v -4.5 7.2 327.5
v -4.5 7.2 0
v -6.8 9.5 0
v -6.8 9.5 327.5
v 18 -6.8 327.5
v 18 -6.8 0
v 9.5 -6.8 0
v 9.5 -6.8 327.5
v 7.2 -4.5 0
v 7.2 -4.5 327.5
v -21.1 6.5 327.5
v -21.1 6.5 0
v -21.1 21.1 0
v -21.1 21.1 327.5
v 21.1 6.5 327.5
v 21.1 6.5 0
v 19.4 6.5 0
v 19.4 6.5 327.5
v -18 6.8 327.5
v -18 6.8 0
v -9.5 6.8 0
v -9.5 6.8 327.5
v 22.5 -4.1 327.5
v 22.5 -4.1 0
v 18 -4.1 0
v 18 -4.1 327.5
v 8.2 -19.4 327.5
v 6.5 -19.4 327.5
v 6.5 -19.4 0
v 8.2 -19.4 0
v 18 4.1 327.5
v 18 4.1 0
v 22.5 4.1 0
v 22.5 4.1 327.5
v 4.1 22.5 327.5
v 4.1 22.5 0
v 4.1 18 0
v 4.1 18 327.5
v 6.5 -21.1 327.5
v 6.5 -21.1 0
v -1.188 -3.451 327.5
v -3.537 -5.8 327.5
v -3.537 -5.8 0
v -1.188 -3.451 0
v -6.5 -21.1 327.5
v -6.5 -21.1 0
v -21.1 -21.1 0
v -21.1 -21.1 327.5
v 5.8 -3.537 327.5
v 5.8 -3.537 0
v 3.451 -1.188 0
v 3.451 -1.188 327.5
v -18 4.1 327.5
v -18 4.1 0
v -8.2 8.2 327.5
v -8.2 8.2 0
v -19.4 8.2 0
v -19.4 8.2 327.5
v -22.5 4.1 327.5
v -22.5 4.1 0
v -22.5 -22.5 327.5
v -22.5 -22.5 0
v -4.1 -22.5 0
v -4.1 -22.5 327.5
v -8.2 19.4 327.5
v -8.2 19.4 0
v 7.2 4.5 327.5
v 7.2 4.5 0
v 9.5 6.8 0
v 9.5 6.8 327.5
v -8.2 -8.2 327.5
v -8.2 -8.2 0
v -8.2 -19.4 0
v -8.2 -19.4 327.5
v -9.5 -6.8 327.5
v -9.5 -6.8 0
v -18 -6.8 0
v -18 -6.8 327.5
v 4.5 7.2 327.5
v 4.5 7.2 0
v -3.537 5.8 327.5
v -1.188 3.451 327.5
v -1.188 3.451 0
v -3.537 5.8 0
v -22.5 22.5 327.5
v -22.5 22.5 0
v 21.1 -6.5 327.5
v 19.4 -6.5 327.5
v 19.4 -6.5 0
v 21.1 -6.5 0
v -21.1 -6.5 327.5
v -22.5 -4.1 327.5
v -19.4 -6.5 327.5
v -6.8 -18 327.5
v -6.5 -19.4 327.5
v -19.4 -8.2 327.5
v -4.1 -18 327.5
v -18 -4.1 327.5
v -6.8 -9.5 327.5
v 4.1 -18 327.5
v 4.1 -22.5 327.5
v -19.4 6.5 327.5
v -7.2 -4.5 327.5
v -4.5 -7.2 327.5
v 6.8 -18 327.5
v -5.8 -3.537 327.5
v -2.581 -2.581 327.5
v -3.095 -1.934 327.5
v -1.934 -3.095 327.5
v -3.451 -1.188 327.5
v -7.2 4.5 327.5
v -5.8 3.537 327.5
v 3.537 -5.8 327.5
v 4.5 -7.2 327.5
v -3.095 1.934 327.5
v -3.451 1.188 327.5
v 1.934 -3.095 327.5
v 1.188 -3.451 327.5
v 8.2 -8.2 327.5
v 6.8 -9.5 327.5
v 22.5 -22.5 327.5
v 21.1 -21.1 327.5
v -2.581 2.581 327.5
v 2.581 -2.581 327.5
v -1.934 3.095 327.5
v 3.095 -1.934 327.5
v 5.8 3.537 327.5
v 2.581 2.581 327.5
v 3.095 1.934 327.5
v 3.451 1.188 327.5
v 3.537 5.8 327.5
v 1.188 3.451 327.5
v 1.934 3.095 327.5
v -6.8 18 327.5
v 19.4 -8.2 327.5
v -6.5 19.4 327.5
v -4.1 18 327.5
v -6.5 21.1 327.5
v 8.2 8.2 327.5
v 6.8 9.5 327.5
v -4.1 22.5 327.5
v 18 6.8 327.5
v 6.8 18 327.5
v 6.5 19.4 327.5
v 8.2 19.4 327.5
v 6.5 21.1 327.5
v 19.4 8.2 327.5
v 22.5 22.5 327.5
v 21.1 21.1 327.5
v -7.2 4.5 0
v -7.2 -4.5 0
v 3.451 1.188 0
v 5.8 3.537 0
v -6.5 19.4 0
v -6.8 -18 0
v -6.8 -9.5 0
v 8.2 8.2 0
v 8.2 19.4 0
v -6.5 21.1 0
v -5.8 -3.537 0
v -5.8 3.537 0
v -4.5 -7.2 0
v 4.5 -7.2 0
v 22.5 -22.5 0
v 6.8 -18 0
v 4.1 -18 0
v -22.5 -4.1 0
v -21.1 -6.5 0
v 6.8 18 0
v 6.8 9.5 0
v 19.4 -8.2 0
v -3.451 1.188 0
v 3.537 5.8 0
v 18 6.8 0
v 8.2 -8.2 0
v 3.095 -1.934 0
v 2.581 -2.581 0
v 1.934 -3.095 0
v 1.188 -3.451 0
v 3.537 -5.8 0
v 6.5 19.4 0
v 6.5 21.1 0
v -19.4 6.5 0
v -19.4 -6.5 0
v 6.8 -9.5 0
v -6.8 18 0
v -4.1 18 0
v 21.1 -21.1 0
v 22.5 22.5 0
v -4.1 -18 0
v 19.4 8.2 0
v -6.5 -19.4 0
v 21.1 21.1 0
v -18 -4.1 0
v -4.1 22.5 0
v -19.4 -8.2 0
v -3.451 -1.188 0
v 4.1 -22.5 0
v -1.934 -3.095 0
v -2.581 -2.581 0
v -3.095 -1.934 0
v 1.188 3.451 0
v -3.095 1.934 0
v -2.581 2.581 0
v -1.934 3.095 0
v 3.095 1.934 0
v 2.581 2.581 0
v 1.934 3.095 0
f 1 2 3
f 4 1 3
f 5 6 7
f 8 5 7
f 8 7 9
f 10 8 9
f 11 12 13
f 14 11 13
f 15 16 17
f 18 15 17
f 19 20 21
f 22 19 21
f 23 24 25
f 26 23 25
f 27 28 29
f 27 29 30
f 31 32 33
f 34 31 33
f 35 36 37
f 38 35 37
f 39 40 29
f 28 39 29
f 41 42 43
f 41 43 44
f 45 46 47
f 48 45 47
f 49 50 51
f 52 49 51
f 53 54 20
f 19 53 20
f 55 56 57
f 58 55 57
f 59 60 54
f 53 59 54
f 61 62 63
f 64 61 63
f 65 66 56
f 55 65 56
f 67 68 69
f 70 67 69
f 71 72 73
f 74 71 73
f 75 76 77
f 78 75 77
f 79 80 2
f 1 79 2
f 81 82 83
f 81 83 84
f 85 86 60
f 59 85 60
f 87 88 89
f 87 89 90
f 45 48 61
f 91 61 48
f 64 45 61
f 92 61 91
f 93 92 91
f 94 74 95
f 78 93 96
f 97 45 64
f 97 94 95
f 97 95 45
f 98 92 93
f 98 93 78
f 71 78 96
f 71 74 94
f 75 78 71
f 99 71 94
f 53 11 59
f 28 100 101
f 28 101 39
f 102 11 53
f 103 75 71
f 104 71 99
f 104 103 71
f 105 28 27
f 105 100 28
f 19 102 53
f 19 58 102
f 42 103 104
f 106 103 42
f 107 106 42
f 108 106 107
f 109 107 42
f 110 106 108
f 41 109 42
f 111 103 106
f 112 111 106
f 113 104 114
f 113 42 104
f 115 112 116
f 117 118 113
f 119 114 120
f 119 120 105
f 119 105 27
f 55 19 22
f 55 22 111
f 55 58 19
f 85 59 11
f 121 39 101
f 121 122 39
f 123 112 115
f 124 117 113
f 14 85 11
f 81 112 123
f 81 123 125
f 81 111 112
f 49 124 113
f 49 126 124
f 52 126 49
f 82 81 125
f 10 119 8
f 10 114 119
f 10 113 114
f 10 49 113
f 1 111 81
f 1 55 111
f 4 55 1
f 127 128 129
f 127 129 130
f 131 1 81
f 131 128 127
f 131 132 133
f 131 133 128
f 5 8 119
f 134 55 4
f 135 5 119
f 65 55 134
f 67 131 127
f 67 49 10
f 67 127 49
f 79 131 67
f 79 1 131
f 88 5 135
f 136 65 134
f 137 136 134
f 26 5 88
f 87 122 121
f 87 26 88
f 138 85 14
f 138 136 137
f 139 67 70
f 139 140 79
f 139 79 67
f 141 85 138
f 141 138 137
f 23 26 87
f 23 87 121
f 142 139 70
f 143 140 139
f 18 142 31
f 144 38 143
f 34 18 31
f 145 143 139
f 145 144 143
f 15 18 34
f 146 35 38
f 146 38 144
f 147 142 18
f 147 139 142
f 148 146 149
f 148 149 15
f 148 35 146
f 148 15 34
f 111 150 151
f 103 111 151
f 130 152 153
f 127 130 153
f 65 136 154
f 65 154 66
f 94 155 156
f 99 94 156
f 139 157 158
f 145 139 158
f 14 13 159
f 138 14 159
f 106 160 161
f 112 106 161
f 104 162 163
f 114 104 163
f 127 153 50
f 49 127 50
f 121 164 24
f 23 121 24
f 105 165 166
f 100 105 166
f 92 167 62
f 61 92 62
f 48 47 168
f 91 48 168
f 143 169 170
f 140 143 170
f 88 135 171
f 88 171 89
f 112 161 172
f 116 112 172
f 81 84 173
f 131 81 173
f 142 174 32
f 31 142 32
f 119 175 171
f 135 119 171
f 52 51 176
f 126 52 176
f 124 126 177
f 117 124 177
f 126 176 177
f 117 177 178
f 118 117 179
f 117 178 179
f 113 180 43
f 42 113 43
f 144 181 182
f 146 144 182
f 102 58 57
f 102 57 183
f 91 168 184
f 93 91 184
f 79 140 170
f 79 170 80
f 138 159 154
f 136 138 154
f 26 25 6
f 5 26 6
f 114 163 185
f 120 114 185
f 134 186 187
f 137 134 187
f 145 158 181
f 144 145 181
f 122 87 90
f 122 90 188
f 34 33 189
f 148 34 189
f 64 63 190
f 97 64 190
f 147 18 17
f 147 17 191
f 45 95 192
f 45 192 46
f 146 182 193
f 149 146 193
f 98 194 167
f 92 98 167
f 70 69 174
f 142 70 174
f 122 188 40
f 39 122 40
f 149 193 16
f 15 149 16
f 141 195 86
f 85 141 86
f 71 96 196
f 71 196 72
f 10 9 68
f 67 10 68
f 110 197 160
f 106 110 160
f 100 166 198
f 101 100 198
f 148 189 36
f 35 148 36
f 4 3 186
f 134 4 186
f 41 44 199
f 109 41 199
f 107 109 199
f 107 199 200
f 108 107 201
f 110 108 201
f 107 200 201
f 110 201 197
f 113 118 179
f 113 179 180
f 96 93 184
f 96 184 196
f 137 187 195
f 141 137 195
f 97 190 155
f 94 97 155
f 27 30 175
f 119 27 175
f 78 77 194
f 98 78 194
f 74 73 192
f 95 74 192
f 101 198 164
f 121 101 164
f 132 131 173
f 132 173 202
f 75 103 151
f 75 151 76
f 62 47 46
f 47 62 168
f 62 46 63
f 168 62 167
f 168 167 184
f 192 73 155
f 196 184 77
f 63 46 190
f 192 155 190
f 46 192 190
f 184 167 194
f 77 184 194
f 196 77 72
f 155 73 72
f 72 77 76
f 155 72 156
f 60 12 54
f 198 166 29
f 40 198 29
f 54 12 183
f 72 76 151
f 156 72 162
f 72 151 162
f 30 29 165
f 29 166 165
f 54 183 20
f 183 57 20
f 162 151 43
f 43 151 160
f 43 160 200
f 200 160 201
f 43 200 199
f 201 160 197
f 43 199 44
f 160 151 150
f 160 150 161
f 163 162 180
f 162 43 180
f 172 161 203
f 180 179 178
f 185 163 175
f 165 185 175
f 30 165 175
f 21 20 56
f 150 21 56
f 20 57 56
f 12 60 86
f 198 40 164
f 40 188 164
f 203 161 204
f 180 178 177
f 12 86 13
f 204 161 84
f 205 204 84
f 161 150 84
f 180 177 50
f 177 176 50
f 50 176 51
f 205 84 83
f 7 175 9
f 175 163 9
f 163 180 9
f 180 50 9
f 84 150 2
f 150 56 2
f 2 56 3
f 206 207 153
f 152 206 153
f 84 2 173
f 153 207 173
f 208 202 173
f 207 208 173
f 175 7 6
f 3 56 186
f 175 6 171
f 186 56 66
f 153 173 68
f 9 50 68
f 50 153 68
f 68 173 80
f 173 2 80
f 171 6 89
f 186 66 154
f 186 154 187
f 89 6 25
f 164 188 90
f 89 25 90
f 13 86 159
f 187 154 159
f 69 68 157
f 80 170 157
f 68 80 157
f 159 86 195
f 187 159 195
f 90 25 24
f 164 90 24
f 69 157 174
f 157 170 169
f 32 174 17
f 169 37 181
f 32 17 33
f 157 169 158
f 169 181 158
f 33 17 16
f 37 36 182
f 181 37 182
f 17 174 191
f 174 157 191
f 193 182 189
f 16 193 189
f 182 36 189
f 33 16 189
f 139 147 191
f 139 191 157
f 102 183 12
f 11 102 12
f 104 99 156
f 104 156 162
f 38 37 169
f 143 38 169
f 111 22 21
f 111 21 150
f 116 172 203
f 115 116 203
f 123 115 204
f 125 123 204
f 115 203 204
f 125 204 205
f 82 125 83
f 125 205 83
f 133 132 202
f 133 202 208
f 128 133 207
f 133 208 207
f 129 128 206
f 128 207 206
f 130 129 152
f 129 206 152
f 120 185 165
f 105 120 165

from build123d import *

# Parameters (mm, degrees)
BOSS_EXTRUDE1_DEPTH = 327.500000024


with BuildPart() as part:
    # Sketch1 → Boss-Extrude1 (new body)
    with BuildSketch(Plane.XY):
        Polygon((-22.499997904, -22.500007621), (-4.099997904, -22.500007621), (-4.099997904, -18.000007621), (-6.799997904, -18.000007621), (-6.799997904, -9.500007621), (-4.499997904, -7.200007621), (4.500002096, -7.200007621), (6.800002096, -9.500007621), (6.800002096, -18.000007621), (4.100002096, -18.000007621), (4.100002096, -22.500007621), (22.500002096, -22.500007621), (22.500002096, -4.100007621), (18.000002096, -4.100007621), (18.000002096, -6.800007621), (9.500002096, -6.800007621), (7.200002096, -4.500007621), (7.200002096, 4.499992379), (9.500002096, 6.799992379), (18.000002096, 6.799992379), (18.000002096, 4.099992379), (22.500002096, 4.099992379), (22.500002096, 22.499992379), (4.100002096, 22.499992379), (4.100002096, 17.999992379), (6.800002096, 17.999992379), (6.800002096, 9.499992379), (4.500002096, 7.199992379), (-4.499997904, 7.199992379), (-6.799997904, 9.499992379), (-6.799997904, 17.999992379), (-4.099997904, 17.999992379), (-4.099997904, 22.499992379), (-22.499997904, 22.499992379), (-22.499997904, 4.099992379), (-17.999997904, 4.099992379), (-17.999997904, 6.799992379), (-9.499997904, 6.799992379), (-7.199997904, 4.499992379), (-7.199997904, -4.500007621), (-9.499997904, -6.800007621), (-17.999997904, -6.800007621), (-17.999997904, -4.100007621), (-22.499997904, -4.100007621), align=None)
        Polygon((8.200003223, 8.199980186), (8.199989777, 19.399992368), (6.500002085, 19.399992368), (6.500002085, 21.099984758), (21.100004192, 21.099984758), (21.100004192, 6.499980188), (19.400009891, 6.499980188), (19.400009891, 8.199980186), align=None, mode=Mode.SUBTRACT)
        Polygon((-19.399997893, 6.499992368), (-21.099990283, 6.499992368), (-21.099990283, 21.099994475), (-6.499974376, 21.099994475), (-6.49997587, 19.399985233), (-8.199975868, 19.399986727), (-8.199985712, 8.19998006), (-19.399997893, 8.19998006), align=None, mode=Mode.SUBTRACT)
        Polygon((-6.499997893, -21.1), (-21.1, -21.1), (-21.1, -6.499995431), (-19.400002096, -6.499995431), (-19.400002096, -8.199995429), (-8.199995429, -8.199995429), (-8.199995429, -19.40000761), (-6.499997893, -19.400009104), align=None, mode=Mode.SUBTRACT)
        Polygon((6.499989905, -19.400011813), (8.199989903, -19.400011813), (8.199989903, -8.200005146), (19.400002085, -8.200005146), (19.400003579, -6.500017454), (21.099994475, -6.500018948), (21.099994475, -21.100009717), (6.499989905, -21.100009717), align=None, mode=Mode.SUBTRACT)
        with BuildLine():
            Line((-5.799999723, 3.537265469), (-3.451121085, 1.18838683))
            ThreePointArc((-3.451121085, 1.18838683), (-2.580942431, 2.580937072), (-1.188393996, 3.451118617))
            Line((-1.188393996, 3.451118617), (-3.537277512, 5.799992379))
            Line((-3.537277512, 5.799992379), (3.537277512, 5.799992379))
            Line((3.537277512, 5.799992379), (1.188393996, 3.451118617))
            ThreePointArc((1.188393996, 3.451118617), (2.580942431, 2.580937072), (3.451121085, 1.18838683))
            Line((3.451121085, 1.18838683), (5.799999723, 3.537265469))
            Line((5.799999723, 3.537265469), (5.799985034, -3.537266022))
            Line((5.799985034, -3.537266022), (3.451117181, -1.188398168))
            ThreePointArc((3.451117181, -1.188398168), (2.580938191, -2.580941312), (1.188393996, -3.451118617))
            Line((1.188393996, -3.451118617), (3.537277512, -5.799992379))
            Line((3.537277512, -5.799992379), (-3.537277512, -5.799992379))
            Line((-3.537277512, -5.799992379), (-1.188393996, -3.451118617))
            ThreePointArc((-1.188393996, -3.451118617), (-2.580938191, -2.580941311), (-3.451117181, -1.188398168))
            Line((-3.451117181, -1.188398168), (-5.799985034, -3.537266022))
            Line((-5.799985034, -3.537266022), (-5.799999723, 3.537265469))
        make_face(mode=Mode.SUBTRACT)
    extrude(amount=BOSS_EXTRUDE1_DEPTH)


solid = part.part
